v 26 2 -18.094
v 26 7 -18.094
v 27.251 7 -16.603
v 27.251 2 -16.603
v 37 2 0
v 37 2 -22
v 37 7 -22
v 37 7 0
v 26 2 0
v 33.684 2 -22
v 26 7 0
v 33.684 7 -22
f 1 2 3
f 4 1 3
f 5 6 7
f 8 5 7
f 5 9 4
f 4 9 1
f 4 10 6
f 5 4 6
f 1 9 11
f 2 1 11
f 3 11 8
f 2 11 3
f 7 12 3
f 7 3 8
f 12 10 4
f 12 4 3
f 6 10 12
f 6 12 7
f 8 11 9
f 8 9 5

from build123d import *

# Parameters (mm, degrees)
BOX020_W               = 5
BOX020_H               = 96
BOX020_DEPTH           = 60
BOX020_PLACEMENT_ANGLE = 310
BOX017_W               = 11
BOX017_H               = 5
BOX017_DEPTH           = 22


with BuildPart() as cube020:
    # Box020 → Box020 (new body)
    with BuildSketch(Plane.XY):
        with Locations((2.5, 48)):
            Rectangle(BOX020_W, BOX020_H)
    extrude(amount=BOX020_DEPTH)


with BuildPart() as cube020_1:
    # Box020 placement: moved
    add(cube020.part.moved(Location((70, 2, -59))).rotate(Axis((70, 2, -59), (0, 1, 0)), BOX020_PLACEMENT_ANGLE))


with BuildPart() as cut011:
    # Box017 → Box017 (new body)
    with BuildSketch(Plane(origin=(26, 2, -22), x_dir=(1, 0, 0), z_dir=(0, 0, 1))):
        with Locations((5.5, 2.5)):
            Rectangle(BOX017_W, BOX017_H)
    extrude(amount=BOX017_DEPTH)

    # Cut011: cut Cube020
    add(cube020_1.part, mode=Mode.SUBTRACT)


solid = cut011.part
